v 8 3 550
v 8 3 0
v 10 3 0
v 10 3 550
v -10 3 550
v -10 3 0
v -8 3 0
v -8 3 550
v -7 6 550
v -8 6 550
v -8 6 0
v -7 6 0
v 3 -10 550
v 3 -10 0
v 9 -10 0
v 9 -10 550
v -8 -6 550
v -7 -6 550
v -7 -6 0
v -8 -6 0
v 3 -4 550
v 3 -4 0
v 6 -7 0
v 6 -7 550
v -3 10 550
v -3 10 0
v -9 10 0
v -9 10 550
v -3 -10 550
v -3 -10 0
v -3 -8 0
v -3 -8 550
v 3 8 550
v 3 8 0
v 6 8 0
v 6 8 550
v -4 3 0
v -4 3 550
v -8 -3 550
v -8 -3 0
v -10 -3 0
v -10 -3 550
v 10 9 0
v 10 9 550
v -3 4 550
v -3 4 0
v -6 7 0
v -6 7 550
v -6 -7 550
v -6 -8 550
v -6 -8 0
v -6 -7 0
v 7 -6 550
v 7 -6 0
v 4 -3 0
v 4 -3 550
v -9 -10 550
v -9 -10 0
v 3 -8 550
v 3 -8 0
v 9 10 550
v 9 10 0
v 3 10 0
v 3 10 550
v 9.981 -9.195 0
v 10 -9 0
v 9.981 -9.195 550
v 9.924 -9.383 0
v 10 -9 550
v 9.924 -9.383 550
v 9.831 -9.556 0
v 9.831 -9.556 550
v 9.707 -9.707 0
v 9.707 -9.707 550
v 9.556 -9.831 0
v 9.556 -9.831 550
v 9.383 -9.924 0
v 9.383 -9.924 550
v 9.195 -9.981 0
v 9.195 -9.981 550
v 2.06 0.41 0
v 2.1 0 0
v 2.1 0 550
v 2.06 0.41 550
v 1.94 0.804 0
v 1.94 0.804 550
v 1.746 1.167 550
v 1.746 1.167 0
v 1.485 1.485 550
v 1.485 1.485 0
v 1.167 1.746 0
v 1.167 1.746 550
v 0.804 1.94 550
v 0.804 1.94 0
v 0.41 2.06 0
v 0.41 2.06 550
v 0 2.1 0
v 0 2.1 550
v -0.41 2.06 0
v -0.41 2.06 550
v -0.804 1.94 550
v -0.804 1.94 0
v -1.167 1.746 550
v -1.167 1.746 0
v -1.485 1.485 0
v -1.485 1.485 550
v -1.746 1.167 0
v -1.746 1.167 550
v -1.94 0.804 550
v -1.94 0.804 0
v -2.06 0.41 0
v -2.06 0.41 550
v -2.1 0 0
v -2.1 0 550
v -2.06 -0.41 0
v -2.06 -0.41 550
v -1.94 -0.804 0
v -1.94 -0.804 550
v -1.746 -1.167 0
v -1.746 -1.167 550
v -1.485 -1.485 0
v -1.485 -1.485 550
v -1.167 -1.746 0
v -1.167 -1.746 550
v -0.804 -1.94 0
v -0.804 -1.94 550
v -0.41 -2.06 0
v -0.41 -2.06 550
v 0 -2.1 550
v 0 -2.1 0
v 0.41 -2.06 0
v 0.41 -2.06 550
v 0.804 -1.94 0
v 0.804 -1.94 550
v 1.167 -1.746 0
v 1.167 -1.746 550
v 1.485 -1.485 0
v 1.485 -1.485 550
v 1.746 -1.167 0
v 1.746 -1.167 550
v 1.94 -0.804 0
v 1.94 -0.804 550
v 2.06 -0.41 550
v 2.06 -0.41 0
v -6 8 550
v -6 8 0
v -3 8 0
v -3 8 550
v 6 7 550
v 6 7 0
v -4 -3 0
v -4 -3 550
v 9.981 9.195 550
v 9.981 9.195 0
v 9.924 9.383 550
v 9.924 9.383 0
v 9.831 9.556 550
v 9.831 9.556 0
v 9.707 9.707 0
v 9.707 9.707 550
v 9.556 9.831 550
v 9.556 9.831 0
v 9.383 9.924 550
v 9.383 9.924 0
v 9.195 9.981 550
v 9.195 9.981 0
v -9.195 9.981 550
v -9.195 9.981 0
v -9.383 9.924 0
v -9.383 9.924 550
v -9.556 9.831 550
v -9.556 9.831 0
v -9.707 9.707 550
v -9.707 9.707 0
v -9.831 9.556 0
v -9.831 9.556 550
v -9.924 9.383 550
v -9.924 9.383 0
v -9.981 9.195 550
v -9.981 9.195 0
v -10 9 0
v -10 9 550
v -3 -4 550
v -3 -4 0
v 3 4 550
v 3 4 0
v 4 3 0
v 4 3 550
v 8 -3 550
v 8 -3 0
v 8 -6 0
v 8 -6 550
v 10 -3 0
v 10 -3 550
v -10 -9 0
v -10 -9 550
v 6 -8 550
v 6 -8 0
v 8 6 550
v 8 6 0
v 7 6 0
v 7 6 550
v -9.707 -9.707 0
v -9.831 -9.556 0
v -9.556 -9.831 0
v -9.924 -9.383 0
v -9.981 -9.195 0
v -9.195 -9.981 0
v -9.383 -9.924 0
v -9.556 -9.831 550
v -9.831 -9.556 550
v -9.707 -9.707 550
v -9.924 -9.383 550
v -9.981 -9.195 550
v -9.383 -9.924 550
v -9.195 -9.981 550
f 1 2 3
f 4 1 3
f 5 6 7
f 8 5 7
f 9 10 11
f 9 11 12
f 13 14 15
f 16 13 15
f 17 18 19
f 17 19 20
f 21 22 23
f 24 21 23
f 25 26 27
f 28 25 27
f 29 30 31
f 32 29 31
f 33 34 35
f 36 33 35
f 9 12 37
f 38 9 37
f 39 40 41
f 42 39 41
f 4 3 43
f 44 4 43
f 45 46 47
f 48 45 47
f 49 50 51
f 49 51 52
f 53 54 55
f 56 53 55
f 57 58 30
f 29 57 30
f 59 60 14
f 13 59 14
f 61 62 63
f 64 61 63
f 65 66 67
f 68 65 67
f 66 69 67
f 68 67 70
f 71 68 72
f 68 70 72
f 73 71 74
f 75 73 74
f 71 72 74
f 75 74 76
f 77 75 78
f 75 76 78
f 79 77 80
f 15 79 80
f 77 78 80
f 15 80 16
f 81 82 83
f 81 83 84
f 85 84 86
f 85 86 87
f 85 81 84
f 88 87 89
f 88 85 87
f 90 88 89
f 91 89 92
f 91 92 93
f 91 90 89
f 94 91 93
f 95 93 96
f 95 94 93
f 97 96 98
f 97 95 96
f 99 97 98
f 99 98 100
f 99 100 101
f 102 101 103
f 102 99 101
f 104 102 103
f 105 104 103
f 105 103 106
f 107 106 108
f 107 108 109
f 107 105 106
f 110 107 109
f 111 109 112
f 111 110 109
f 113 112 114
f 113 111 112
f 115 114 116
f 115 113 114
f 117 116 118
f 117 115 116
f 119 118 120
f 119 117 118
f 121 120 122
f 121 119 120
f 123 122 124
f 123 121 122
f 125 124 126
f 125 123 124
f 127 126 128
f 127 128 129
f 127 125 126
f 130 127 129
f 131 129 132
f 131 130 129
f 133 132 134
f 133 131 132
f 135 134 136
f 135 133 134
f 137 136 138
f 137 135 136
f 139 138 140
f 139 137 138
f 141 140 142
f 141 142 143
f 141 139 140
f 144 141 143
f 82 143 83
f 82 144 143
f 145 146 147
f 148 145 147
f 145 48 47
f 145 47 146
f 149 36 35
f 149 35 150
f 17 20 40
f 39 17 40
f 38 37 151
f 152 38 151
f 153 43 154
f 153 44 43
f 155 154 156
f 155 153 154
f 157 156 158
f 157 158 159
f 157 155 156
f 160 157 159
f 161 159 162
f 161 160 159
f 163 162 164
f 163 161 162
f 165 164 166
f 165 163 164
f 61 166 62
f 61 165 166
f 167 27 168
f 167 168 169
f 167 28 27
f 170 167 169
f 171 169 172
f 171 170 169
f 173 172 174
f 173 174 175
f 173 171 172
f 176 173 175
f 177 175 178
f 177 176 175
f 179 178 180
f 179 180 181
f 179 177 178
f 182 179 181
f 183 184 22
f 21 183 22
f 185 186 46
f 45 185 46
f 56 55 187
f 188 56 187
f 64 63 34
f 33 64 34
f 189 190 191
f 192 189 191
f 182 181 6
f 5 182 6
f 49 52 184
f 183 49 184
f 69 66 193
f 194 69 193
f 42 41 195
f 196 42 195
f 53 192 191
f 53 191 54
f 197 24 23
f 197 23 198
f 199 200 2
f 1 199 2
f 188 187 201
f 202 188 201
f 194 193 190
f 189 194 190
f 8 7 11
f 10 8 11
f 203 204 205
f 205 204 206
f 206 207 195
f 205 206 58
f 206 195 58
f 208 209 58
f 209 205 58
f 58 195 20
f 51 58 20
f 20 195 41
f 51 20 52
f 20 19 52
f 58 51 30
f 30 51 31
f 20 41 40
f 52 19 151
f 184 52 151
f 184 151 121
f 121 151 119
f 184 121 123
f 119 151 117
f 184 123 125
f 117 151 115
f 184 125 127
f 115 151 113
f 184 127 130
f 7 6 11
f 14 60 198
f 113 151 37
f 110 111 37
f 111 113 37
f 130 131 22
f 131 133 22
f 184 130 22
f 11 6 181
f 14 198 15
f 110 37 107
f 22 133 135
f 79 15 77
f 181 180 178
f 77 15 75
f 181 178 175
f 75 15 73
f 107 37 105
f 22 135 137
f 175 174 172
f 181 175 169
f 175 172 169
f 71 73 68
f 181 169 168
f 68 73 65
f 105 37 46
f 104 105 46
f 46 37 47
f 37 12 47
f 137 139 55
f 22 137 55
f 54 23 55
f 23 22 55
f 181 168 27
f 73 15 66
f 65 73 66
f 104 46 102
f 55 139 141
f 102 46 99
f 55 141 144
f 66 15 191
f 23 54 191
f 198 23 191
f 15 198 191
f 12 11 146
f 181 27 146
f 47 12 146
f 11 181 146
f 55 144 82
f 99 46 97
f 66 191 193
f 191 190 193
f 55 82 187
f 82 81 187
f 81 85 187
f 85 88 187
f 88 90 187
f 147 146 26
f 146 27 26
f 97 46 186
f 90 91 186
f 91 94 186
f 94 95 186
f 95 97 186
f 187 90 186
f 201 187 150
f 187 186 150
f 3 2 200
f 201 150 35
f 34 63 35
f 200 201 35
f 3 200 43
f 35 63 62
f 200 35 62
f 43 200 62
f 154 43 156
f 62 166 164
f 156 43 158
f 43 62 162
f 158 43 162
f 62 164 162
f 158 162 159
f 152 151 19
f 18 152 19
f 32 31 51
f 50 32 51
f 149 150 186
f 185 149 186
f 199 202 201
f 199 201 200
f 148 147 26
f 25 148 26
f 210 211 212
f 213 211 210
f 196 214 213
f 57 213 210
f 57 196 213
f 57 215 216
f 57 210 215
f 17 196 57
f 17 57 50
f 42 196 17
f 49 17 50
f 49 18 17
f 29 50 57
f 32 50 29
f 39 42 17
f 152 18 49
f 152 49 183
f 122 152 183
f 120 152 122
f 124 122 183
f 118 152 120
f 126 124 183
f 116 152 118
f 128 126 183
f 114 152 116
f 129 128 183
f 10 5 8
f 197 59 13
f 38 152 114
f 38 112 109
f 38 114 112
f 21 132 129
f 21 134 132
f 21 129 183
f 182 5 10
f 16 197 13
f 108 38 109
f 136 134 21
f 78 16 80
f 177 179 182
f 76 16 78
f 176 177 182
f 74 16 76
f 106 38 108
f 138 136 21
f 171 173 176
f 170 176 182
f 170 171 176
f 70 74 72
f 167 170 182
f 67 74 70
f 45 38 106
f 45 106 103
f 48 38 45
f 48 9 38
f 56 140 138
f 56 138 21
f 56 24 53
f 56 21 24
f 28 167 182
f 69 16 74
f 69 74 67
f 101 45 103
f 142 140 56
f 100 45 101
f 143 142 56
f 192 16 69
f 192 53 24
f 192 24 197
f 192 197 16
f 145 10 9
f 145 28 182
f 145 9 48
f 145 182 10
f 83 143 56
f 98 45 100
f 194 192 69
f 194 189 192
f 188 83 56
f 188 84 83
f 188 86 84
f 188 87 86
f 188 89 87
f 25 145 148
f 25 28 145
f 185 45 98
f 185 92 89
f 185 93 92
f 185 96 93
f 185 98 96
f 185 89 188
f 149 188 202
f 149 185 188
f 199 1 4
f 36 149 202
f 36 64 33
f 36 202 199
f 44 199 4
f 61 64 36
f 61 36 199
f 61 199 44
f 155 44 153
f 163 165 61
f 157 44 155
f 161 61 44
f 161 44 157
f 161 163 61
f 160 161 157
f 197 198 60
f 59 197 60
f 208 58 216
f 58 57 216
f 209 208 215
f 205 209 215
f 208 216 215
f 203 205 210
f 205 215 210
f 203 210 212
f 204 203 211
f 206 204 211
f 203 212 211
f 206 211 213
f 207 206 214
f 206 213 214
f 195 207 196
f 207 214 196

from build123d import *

# Parameters (mm, degrees)
SCHIZZO1_R                   = 2.1
ESTRUSIONE_ESTRUSIONE1_DEPTH = 550
RACCORDO1_R                  = 1


with BuildPart() as part:
    # Schizzo1 → Estrusione-Estrusione1 (new body)
    with BuildSketch(Plane.XY):
        Polygon((10, 3), (10, 10), (3, 10), (3, 8), (6, 8), (6, 7), (3, 4), (-3, 4), (-6, 7), (-6, 8), (-3, 8), (-3, 10), (-10, 10), (-10, 3), (-8, 3), (-8, 6), (-7, 6), (-4, 3), (-4, -3), (-7, -6), (-8, -6), (-8, -3), (-10, -3), (-10, -10), (-3, -10), (-3, -8), (-6, -8), (-6, -7), (-3, -4), (3, -4), (6, -7), (6, -8), (3, -8), (3, -10), (10, -10), (10, -3), (8, -3), (8, -6), (7, -6), (4, -3), (4, 3), (7, 6), (8, 6), (8, 3), align=None)
        Circle(SCHIZZO1_R, mode=Mode.SUBTRACT)
    extrude(amount=ESTRUSIONE_ESTRUSIONE1_DEPTH)

    # Raccordo1
    raccordo1_edges = [part.edges().sort_by_distance(p)[0] for p in [
        (-10, 10, 275),
        (10, 10, 275),
        (10, -10, 275),
        (-10, -10, 275),
    ]]
    fillet(raccordo1_edges, radius=RACCORDO1_R)


solid = part.part
